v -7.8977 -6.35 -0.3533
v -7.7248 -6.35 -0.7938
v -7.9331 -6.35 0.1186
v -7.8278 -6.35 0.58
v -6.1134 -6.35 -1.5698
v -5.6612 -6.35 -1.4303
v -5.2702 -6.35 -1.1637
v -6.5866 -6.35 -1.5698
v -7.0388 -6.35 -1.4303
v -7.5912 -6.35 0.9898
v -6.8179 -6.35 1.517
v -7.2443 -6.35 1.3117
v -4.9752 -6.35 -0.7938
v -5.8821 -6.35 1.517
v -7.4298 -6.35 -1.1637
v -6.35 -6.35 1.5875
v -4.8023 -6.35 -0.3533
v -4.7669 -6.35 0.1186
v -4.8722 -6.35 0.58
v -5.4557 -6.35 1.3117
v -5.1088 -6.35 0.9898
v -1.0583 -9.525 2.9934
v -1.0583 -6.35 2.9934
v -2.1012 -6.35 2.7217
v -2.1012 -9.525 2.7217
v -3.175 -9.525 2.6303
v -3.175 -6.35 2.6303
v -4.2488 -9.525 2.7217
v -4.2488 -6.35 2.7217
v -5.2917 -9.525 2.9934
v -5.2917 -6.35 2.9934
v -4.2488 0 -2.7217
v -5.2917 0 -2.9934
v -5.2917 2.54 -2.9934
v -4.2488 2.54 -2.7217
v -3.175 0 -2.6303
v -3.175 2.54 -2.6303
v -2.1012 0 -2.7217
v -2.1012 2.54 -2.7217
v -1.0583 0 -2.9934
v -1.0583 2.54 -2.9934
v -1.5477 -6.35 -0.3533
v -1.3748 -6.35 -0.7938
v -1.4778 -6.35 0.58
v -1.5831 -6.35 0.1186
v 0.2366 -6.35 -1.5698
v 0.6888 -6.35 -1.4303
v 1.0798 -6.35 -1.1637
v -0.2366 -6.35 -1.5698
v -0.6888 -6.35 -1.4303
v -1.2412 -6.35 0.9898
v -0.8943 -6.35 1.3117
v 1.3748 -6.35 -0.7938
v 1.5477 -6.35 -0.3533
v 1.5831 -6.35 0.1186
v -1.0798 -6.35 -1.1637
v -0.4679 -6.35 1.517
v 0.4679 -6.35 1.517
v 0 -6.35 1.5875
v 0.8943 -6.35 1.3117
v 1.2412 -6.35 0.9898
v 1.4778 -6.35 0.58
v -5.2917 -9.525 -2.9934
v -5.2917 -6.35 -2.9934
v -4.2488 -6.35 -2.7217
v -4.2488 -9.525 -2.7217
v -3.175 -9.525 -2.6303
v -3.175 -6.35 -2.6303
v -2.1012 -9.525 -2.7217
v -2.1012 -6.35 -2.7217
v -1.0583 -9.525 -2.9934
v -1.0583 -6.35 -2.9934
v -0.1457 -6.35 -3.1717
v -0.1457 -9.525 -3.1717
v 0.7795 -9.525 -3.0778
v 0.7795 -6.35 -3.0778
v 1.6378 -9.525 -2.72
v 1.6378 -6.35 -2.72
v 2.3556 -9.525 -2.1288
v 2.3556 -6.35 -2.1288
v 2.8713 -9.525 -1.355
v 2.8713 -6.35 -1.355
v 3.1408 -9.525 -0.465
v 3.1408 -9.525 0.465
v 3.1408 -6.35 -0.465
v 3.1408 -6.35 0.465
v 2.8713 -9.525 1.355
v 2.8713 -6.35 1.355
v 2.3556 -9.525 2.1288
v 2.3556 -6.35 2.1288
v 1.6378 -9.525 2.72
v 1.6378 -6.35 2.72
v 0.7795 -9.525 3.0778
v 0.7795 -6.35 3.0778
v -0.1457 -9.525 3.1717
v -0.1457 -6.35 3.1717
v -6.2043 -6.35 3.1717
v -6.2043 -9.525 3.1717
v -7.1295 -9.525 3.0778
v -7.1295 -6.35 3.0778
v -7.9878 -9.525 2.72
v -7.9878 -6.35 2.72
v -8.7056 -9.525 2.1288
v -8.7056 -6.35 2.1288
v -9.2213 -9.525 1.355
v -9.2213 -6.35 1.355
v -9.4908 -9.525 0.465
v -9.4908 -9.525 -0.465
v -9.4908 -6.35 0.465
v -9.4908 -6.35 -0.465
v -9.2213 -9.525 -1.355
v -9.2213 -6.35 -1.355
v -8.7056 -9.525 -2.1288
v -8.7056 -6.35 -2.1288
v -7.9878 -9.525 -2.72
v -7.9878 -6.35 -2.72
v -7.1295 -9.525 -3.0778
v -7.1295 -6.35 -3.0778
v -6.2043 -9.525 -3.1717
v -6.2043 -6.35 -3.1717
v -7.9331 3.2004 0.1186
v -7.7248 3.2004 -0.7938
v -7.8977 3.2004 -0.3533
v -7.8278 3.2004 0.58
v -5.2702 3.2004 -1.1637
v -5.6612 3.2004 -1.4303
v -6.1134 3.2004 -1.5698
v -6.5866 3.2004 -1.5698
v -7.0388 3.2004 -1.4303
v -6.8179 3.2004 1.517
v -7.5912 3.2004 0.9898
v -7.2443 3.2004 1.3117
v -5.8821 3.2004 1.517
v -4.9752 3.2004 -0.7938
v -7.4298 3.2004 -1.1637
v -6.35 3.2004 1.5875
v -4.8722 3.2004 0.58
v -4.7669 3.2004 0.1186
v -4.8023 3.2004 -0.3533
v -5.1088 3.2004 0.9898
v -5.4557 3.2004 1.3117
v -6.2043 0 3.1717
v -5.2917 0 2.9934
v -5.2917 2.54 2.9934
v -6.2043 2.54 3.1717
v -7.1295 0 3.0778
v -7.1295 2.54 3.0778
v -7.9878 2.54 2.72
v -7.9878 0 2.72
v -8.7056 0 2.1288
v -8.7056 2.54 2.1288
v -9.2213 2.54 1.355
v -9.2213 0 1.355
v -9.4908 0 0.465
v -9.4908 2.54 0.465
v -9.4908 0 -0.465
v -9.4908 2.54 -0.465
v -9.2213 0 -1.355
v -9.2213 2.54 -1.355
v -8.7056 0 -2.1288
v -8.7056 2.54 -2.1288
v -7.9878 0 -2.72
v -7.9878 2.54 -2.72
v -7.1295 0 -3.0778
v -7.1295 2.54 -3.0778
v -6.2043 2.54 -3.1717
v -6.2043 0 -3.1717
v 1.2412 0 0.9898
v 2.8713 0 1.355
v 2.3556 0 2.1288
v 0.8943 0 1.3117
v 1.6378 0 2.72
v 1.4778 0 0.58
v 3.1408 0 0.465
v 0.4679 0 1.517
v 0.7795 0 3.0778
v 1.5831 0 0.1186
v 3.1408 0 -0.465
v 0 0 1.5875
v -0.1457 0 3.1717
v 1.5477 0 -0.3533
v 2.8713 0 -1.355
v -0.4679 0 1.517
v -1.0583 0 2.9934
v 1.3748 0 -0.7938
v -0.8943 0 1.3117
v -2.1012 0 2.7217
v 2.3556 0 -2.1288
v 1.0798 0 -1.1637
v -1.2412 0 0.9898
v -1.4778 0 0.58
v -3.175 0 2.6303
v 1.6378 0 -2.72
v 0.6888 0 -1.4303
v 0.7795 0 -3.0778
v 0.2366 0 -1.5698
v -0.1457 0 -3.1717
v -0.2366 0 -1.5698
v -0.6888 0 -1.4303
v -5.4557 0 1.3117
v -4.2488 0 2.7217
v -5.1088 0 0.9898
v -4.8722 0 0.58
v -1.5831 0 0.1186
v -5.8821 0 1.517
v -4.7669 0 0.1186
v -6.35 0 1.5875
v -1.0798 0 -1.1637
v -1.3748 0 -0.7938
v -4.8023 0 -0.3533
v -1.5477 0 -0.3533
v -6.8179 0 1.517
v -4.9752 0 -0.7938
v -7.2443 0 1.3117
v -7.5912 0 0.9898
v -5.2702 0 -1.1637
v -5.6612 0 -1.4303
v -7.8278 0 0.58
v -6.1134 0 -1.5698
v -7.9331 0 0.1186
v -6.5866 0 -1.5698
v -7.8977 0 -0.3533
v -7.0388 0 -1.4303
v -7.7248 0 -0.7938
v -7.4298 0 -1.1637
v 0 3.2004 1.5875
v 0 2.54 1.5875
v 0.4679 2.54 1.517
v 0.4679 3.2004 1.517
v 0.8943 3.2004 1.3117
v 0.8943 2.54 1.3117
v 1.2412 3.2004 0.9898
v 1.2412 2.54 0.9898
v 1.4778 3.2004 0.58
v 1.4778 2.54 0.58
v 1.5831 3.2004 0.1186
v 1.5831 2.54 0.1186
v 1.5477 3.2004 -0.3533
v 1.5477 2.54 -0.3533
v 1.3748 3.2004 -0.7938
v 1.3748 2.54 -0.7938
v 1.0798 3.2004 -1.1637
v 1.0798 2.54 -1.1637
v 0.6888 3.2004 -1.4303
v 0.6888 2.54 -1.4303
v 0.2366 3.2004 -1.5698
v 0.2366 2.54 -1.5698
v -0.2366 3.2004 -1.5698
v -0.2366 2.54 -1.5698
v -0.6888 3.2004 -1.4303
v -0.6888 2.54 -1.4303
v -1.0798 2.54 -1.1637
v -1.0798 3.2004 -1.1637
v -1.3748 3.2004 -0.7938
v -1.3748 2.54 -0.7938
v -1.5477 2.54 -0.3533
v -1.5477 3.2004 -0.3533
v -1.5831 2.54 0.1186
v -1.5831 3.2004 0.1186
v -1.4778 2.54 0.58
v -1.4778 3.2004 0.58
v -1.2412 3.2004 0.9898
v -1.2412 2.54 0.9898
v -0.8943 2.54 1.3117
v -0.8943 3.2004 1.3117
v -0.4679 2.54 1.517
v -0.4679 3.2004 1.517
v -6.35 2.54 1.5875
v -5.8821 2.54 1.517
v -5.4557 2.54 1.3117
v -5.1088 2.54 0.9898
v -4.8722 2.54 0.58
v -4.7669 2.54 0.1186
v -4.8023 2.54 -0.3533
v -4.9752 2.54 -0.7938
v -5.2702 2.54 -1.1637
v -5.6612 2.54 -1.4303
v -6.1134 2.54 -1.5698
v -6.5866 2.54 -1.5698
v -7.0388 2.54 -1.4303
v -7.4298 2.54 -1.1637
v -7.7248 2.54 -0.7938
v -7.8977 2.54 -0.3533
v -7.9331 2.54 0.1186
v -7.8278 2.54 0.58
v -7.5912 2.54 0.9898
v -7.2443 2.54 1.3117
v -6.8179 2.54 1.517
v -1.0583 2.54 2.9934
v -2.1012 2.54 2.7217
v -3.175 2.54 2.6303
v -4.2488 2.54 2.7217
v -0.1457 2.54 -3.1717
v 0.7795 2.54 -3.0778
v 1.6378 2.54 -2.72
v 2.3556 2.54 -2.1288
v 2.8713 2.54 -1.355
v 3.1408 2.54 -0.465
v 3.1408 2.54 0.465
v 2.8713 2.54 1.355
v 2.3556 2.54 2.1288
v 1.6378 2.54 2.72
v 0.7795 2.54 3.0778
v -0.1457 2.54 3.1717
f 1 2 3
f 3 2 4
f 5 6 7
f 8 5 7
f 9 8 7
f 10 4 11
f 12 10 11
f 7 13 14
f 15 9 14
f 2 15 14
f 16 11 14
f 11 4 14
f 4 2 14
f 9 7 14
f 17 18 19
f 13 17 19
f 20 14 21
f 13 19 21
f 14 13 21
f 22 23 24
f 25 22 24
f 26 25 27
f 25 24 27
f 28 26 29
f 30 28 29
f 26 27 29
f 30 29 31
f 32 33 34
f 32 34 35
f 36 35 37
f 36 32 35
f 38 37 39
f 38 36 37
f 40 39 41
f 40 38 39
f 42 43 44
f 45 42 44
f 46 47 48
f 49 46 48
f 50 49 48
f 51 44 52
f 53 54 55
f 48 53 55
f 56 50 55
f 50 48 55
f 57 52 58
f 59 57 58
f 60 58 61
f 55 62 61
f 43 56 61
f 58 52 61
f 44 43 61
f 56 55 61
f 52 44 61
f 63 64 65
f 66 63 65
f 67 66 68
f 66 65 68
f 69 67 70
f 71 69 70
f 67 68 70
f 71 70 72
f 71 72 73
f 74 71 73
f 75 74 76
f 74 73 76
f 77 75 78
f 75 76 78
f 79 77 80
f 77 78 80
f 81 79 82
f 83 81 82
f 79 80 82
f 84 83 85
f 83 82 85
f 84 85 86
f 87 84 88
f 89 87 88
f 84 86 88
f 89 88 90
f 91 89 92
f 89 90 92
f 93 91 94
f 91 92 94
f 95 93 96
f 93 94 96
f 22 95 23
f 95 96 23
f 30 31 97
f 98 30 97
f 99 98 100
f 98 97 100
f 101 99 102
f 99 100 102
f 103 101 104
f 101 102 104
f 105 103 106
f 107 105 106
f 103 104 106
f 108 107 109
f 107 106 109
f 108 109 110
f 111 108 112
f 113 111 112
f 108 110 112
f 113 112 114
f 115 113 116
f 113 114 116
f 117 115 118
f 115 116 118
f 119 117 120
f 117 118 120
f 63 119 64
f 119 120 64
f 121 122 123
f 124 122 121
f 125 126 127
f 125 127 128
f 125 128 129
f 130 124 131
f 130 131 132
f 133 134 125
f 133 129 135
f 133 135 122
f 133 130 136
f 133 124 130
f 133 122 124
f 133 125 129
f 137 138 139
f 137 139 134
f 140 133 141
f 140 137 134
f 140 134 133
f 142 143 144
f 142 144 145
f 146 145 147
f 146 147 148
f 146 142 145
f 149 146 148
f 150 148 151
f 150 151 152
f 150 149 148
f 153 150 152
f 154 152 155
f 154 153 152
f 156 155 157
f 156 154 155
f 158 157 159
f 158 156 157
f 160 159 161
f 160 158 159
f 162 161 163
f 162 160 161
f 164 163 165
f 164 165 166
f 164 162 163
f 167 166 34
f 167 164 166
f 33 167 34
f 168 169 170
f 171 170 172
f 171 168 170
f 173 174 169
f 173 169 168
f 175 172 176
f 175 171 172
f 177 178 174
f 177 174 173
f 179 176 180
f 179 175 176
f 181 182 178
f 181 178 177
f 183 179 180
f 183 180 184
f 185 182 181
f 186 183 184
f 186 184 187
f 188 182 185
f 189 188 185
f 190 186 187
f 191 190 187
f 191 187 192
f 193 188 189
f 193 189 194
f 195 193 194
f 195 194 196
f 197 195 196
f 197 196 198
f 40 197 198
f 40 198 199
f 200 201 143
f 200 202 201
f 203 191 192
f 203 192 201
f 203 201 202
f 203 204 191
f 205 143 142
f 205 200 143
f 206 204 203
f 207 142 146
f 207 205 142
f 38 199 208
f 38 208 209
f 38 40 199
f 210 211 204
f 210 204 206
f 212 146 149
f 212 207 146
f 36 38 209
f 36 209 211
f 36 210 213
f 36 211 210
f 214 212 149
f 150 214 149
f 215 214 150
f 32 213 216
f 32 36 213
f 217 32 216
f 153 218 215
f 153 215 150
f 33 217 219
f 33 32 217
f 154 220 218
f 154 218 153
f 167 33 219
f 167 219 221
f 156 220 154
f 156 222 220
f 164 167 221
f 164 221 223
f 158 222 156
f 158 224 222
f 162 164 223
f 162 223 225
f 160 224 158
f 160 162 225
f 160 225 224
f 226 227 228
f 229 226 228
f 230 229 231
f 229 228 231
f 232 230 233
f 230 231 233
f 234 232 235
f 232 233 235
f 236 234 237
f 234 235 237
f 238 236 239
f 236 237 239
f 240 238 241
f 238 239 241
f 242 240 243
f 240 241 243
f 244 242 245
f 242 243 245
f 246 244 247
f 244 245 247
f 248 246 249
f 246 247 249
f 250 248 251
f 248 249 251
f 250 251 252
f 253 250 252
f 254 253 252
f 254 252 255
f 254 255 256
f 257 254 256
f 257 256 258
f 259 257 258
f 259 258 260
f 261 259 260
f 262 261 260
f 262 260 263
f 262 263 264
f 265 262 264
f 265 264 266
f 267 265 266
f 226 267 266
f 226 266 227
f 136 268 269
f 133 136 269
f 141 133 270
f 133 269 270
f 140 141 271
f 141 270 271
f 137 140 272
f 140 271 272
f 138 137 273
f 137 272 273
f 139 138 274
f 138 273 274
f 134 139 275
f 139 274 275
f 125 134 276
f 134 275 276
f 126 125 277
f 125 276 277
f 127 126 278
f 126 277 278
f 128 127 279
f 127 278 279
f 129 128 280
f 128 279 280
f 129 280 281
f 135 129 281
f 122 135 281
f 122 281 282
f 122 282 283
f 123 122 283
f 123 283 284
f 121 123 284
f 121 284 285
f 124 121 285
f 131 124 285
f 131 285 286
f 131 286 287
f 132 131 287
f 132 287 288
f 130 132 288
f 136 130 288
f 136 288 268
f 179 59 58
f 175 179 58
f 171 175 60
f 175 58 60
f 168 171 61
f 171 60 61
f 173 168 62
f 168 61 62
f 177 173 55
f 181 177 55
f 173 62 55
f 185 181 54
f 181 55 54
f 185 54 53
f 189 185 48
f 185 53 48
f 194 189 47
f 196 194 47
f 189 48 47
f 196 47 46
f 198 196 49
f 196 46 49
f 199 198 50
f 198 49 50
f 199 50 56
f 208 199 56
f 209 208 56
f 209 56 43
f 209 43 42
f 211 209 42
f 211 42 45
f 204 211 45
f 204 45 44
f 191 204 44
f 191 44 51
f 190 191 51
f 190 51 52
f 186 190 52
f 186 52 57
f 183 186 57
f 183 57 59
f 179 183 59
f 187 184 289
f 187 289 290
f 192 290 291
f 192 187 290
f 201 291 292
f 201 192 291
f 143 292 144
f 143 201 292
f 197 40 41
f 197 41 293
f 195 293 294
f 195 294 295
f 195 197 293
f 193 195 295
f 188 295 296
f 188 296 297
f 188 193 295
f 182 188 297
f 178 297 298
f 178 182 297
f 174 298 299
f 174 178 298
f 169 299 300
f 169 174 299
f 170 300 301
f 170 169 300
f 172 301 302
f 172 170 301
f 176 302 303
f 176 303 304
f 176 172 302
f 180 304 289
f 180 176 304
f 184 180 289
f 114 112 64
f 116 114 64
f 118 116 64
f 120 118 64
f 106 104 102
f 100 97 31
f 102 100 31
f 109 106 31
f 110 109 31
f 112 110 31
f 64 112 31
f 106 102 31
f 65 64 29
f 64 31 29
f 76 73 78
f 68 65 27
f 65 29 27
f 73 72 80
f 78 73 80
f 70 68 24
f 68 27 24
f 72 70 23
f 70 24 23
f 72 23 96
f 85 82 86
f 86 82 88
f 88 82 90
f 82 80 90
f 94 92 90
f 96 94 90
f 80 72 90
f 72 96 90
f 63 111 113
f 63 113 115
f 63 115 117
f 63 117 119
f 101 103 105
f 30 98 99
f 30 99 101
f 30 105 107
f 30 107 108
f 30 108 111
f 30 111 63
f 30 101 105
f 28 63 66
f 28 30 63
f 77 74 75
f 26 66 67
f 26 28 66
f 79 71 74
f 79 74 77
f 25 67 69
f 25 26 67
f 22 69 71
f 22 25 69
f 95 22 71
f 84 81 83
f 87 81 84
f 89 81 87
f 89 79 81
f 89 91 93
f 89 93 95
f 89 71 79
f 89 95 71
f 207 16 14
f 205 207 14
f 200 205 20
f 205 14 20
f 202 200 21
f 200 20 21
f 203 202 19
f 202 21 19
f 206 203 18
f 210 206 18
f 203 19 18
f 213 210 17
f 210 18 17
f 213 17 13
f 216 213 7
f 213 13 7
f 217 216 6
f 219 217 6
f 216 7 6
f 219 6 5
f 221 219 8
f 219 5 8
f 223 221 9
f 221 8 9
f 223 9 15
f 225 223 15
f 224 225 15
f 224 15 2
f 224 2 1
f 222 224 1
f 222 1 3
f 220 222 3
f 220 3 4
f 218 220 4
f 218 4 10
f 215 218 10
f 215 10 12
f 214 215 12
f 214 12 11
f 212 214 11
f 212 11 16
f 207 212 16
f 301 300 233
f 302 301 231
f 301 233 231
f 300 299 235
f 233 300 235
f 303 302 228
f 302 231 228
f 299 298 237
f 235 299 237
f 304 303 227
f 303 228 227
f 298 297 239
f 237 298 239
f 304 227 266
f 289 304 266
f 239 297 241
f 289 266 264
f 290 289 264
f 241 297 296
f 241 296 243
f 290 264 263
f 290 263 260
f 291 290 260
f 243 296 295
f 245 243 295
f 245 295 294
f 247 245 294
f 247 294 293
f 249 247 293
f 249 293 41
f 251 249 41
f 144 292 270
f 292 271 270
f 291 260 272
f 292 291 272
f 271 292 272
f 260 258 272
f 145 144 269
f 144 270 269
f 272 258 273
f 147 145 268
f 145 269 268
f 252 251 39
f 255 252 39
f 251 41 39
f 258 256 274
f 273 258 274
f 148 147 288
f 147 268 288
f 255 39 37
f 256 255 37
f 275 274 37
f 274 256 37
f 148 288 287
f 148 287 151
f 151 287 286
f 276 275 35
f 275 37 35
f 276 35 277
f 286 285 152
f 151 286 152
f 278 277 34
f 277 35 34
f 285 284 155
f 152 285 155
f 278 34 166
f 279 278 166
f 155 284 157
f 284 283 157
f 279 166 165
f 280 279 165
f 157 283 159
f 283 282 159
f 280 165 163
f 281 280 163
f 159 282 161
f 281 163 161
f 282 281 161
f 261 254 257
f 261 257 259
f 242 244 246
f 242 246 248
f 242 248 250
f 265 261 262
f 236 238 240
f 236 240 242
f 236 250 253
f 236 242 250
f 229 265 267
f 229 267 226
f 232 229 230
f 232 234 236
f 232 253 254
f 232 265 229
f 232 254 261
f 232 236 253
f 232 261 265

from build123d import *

# Parameters (mm, degrees)
SKETCH1_R                = 1.5875
BOSS_EXTRUDE1_DEPTH      = 2.54
BOSS_EXTRUDE2_DEPTH      = 3.2004
BOSS_EXTRUDE2_DEPTH_BACK = 6.35
SKETCH1_4_R              = 1.5875
BOSS_EXTRUDE3_DEPTH      = 3.175


with BuildPart() as part:
    # Sketch1 → Boss-Extrude1 (new body)
    with BuildSketch(Plane(origin=(0, 0, 0), x_dir=(1, 0, 0), z_dir=(0, 1, 0))):
        with BuildLine():
            ThreePointArc((-5.291666667, 2.993418707), (-9.525, 0), (-5.291666667, -2.993418707))
            ThreePointArc((-5.291666667, -2.993418707), (-3.175, -2.630256121), (-1.058333333, -2.993418707))
            ThreePointArc((-1.058333333, -2.993418707), (3.175, 0), (-1.058333333, 2.993418707))
            ThreePointArc((-1.058333333, 2.993418707), (-3.175, 2.630256121), (-5.291666667, 2.993418707))
        make_face()
        with Locations((-6.35, 0)):
            Circle(SKETCH1_R, mode=Mode.SUBTRACT)
        Circle(SKETCH1_R, mode=Mode.SUBTRACT)
    extrude(amount=BOSS_EXTRUDE1_DEPTH)

    # Sketch1<4> → Boss-Extrude2 (add, two sides: drawn at the far end of the back side and taken through both)
    with BuildSketch(Plane(origin=(0, 0, 0), x_dir=(1, 0, 0), z_dir=(0, 1, 0)).offset(-BOSS_EXTRUDE2_DEPTH_BACK)):
        with Locations((-6.35, 0)):
            Circle(SKETCH1_4_R)
        Circle(SKETCH1_4_R)
    extrude(amount=BOSS_EXTRUDE2_DEPTH + BOSS_EXTRUDE2_DEPTH_BACK)


with BuildPart() as body_2:
    # Sketch2 → Boss-Extrude3 (new body)
    with BuildSketch(Plane.XZ.offset(6.35)):
        with BuildLine():
            ThreePointArc((-5.291666667, 2.993418707), (-9.525, 0), (-5.291666667, -2.993418707))
            ThreePointArc((-5.291666667, -2.993418707), (-3.175, -2.630256121), (-1.058333333, -2.993418707))
            ThreePointArc((-1.058333333, -2.993418707), (3.175, 0), (-1.058333333, 2.993418707))
            ThreePointArc((-1.058333333, 2.993418707), (-3.175, 2.630256121), (-5.291666667, 2.993418707))
        make_face()
    extrude(amount=BOSS_EXTRUDE3_DEPTH)


solid = Compound([part.part, body_2.part])
